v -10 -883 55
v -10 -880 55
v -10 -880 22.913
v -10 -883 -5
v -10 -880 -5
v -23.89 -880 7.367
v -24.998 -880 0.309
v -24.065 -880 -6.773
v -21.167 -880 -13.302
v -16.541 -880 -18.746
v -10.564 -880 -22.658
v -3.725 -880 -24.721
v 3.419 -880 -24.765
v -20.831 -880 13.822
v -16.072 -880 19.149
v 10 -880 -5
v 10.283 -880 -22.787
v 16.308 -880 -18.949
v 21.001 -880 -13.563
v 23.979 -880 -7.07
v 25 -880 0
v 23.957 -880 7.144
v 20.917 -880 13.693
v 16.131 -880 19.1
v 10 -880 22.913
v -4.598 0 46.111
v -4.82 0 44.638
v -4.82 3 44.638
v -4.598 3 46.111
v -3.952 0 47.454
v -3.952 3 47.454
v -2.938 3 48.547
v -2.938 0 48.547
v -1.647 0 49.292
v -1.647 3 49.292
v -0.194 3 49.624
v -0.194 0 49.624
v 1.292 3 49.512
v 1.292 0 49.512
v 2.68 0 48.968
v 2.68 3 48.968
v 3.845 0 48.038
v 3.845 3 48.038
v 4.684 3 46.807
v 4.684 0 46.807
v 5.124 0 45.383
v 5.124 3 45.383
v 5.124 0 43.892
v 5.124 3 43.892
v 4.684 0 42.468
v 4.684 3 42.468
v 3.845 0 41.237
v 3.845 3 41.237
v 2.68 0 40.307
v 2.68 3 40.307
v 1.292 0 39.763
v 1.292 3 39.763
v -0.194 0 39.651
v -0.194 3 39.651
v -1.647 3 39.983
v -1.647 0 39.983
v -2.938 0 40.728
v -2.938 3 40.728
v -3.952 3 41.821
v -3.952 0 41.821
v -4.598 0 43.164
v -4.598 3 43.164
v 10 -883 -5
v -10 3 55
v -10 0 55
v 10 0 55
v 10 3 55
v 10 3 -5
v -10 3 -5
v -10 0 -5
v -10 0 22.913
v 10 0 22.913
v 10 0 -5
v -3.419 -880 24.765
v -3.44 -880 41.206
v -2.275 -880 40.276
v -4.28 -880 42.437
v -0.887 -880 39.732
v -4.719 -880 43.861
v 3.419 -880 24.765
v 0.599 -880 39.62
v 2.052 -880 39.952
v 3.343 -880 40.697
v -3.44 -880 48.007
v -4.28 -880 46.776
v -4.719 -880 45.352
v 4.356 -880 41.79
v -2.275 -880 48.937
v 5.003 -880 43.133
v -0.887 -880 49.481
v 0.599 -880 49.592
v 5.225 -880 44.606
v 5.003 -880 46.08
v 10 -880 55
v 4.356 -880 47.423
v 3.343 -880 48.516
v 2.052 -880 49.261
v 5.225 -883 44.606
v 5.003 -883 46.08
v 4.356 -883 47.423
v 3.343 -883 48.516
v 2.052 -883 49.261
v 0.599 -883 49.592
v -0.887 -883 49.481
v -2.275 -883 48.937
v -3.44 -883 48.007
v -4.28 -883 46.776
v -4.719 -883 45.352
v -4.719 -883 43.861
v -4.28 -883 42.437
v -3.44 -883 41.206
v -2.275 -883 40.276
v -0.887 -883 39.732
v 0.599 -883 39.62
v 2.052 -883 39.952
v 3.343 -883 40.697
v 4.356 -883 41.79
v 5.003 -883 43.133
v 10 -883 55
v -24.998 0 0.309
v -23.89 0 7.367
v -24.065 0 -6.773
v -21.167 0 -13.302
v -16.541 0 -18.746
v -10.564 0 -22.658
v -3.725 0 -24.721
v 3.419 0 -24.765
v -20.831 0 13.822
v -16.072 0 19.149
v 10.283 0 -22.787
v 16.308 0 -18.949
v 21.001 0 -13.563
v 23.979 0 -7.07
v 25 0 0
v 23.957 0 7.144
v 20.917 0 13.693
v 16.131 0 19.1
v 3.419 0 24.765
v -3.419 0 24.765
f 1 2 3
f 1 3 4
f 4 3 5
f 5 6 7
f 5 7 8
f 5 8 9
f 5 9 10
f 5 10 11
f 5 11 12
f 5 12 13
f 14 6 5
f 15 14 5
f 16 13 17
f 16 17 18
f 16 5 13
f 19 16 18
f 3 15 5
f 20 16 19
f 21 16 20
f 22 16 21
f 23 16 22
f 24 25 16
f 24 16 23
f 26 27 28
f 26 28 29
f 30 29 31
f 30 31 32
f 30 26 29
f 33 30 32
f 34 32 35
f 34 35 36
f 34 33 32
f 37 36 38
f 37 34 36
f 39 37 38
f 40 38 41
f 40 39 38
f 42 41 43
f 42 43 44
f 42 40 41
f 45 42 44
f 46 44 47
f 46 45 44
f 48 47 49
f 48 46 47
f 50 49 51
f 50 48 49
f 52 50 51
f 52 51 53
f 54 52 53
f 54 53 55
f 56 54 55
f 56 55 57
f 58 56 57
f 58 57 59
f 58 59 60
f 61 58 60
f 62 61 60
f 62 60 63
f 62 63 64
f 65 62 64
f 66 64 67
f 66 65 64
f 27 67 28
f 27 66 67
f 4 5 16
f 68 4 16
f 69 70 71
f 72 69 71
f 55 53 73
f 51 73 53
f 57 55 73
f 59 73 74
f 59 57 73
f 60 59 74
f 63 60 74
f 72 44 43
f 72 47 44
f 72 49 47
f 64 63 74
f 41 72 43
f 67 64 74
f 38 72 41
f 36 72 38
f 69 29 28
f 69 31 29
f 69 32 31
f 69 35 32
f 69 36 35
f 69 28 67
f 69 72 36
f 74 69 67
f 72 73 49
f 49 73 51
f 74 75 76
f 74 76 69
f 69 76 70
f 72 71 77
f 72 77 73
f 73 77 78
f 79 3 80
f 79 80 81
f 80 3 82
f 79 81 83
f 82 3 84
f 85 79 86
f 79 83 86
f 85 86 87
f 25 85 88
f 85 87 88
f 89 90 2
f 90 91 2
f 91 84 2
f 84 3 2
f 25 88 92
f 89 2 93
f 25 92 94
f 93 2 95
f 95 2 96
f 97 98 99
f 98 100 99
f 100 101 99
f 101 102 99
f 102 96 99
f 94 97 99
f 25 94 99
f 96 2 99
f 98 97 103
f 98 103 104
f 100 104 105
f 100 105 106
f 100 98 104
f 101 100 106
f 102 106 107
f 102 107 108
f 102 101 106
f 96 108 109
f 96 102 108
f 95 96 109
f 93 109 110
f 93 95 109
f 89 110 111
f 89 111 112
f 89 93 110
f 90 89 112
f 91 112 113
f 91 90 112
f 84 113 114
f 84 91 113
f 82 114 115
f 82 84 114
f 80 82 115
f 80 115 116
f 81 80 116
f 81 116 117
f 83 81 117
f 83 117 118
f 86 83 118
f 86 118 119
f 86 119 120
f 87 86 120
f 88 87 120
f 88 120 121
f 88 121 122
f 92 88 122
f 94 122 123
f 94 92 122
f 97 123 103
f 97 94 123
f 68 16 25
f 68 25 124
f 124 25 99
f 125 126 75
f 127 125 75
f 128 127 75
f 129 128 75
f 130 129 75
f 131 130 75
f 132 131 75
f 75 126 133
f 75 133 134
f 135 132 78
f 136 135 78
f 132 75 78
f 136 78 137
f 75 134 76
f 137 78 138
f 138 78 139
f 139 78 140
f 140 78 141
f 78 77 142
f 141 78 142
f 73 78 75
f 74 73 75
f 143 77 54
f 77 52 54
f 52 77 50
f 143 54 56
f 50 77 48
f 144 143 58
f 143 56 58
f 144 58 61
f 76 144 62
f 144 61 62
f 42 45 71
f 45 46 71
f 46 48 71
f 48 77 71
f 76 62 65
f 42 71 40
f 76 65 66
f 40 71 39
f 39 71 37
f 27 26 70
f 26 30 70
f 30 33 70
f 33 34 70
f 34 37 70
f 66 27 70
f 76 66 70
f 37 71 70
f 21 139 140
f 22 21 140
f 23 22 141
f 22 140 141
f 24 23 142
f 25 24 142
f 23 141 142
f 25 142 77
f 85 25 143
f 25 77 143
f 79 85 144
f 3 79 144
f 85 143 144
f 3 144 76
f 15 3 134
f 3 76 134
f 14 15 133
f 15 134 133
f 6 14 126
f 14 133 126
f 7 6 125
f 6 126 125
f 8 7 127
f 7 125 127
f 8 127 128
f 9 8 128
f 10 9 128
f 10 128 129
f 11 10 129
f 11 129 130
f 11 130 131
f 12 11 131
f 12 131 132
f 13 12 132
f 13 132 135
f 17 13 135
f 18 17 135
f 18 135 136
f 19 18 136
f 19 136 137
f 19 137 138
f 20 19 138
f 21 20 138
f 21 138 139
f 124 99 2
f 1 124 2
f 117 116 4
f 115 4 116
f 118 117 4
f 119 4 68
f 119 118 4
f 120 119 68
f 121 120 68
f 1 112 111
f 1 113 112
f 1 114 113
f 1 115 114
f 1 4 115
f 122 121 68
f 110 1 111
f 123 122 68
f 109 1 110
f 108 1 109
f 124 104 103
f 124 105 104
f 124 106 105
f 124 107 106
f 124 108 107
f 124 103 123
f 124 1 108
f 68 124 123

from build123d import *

# Parameters (mm, degrees)
F0_R     = 25
F1_DEPTH = 880
F2_R     = 5
F3_DEPTH = 3
F4_R     = 5
F5_DEPTH = 3


with BuildPart() as f1:
    # F0 (on Front) → F1 (new body)
    with BuildSketch(Plane.XZ):
        Circle(F0_R)
    extrude(amount=F1_DEPTH)

    # F2 (on face) → F3 (join)
    with BuildSketch(Plane.XZ.offset(880)):
        with BuildLine():
            Line((10, 55), (-10, 55))
            Line((-10, 55), (-10, 22.912878))
            ThreePointArc((-10, 22.912878), (0, 25), (10, 22.912878))
            Line((10, 22.912878), (10, 55))
        make_face()
        with Locations((0.225252, 44.60642)):
            Circle(F2_R, mode=Mode.SUBTRACT)
        with BuildLine():
            ThreePointArc((10, 22.912878), (0, 25), (-10, 22.912878))
            Line((-10, 22.912878), (-10, -5))
            Line((-10, -5), (10, -5))
            Line((10, -5), (10, 22.912878))
        make_face()
    extrude(amount=F3_DEPTH)

    # F4 (on face) → F5 (join)
    with BuildSketch(Plane(origin=(0, 0, 0), x_dir=(-1, 0, 0), z_dir=(0, 1, 0))):
        with BuildLine():
            ThreePointArc((10, 22.912878), (0, 25), (-10, 22.912878))
            Line((-10, 22.912878), (-10, -5))
            Line((-10, -5), (10, -5))
            Line((10, -5), (10, 22.912878))
        make_face()
        with BuildLine():
            Line((10, 55), (-10, 55))
            Line((-10, 55), (-10, 22.912878))
            ThreePointArc((-10, 22.912878), (0, 25), (10, 22.912878))
            Line((10, 22.912878), (10, 55))
        make_face()
        with Locations((-0.179578, 44.637514)):
            Circle(F4_R, mode=Mode.SUBTRACT)
    extrude(amount=F5_DEPTH)


solid = f1.part
